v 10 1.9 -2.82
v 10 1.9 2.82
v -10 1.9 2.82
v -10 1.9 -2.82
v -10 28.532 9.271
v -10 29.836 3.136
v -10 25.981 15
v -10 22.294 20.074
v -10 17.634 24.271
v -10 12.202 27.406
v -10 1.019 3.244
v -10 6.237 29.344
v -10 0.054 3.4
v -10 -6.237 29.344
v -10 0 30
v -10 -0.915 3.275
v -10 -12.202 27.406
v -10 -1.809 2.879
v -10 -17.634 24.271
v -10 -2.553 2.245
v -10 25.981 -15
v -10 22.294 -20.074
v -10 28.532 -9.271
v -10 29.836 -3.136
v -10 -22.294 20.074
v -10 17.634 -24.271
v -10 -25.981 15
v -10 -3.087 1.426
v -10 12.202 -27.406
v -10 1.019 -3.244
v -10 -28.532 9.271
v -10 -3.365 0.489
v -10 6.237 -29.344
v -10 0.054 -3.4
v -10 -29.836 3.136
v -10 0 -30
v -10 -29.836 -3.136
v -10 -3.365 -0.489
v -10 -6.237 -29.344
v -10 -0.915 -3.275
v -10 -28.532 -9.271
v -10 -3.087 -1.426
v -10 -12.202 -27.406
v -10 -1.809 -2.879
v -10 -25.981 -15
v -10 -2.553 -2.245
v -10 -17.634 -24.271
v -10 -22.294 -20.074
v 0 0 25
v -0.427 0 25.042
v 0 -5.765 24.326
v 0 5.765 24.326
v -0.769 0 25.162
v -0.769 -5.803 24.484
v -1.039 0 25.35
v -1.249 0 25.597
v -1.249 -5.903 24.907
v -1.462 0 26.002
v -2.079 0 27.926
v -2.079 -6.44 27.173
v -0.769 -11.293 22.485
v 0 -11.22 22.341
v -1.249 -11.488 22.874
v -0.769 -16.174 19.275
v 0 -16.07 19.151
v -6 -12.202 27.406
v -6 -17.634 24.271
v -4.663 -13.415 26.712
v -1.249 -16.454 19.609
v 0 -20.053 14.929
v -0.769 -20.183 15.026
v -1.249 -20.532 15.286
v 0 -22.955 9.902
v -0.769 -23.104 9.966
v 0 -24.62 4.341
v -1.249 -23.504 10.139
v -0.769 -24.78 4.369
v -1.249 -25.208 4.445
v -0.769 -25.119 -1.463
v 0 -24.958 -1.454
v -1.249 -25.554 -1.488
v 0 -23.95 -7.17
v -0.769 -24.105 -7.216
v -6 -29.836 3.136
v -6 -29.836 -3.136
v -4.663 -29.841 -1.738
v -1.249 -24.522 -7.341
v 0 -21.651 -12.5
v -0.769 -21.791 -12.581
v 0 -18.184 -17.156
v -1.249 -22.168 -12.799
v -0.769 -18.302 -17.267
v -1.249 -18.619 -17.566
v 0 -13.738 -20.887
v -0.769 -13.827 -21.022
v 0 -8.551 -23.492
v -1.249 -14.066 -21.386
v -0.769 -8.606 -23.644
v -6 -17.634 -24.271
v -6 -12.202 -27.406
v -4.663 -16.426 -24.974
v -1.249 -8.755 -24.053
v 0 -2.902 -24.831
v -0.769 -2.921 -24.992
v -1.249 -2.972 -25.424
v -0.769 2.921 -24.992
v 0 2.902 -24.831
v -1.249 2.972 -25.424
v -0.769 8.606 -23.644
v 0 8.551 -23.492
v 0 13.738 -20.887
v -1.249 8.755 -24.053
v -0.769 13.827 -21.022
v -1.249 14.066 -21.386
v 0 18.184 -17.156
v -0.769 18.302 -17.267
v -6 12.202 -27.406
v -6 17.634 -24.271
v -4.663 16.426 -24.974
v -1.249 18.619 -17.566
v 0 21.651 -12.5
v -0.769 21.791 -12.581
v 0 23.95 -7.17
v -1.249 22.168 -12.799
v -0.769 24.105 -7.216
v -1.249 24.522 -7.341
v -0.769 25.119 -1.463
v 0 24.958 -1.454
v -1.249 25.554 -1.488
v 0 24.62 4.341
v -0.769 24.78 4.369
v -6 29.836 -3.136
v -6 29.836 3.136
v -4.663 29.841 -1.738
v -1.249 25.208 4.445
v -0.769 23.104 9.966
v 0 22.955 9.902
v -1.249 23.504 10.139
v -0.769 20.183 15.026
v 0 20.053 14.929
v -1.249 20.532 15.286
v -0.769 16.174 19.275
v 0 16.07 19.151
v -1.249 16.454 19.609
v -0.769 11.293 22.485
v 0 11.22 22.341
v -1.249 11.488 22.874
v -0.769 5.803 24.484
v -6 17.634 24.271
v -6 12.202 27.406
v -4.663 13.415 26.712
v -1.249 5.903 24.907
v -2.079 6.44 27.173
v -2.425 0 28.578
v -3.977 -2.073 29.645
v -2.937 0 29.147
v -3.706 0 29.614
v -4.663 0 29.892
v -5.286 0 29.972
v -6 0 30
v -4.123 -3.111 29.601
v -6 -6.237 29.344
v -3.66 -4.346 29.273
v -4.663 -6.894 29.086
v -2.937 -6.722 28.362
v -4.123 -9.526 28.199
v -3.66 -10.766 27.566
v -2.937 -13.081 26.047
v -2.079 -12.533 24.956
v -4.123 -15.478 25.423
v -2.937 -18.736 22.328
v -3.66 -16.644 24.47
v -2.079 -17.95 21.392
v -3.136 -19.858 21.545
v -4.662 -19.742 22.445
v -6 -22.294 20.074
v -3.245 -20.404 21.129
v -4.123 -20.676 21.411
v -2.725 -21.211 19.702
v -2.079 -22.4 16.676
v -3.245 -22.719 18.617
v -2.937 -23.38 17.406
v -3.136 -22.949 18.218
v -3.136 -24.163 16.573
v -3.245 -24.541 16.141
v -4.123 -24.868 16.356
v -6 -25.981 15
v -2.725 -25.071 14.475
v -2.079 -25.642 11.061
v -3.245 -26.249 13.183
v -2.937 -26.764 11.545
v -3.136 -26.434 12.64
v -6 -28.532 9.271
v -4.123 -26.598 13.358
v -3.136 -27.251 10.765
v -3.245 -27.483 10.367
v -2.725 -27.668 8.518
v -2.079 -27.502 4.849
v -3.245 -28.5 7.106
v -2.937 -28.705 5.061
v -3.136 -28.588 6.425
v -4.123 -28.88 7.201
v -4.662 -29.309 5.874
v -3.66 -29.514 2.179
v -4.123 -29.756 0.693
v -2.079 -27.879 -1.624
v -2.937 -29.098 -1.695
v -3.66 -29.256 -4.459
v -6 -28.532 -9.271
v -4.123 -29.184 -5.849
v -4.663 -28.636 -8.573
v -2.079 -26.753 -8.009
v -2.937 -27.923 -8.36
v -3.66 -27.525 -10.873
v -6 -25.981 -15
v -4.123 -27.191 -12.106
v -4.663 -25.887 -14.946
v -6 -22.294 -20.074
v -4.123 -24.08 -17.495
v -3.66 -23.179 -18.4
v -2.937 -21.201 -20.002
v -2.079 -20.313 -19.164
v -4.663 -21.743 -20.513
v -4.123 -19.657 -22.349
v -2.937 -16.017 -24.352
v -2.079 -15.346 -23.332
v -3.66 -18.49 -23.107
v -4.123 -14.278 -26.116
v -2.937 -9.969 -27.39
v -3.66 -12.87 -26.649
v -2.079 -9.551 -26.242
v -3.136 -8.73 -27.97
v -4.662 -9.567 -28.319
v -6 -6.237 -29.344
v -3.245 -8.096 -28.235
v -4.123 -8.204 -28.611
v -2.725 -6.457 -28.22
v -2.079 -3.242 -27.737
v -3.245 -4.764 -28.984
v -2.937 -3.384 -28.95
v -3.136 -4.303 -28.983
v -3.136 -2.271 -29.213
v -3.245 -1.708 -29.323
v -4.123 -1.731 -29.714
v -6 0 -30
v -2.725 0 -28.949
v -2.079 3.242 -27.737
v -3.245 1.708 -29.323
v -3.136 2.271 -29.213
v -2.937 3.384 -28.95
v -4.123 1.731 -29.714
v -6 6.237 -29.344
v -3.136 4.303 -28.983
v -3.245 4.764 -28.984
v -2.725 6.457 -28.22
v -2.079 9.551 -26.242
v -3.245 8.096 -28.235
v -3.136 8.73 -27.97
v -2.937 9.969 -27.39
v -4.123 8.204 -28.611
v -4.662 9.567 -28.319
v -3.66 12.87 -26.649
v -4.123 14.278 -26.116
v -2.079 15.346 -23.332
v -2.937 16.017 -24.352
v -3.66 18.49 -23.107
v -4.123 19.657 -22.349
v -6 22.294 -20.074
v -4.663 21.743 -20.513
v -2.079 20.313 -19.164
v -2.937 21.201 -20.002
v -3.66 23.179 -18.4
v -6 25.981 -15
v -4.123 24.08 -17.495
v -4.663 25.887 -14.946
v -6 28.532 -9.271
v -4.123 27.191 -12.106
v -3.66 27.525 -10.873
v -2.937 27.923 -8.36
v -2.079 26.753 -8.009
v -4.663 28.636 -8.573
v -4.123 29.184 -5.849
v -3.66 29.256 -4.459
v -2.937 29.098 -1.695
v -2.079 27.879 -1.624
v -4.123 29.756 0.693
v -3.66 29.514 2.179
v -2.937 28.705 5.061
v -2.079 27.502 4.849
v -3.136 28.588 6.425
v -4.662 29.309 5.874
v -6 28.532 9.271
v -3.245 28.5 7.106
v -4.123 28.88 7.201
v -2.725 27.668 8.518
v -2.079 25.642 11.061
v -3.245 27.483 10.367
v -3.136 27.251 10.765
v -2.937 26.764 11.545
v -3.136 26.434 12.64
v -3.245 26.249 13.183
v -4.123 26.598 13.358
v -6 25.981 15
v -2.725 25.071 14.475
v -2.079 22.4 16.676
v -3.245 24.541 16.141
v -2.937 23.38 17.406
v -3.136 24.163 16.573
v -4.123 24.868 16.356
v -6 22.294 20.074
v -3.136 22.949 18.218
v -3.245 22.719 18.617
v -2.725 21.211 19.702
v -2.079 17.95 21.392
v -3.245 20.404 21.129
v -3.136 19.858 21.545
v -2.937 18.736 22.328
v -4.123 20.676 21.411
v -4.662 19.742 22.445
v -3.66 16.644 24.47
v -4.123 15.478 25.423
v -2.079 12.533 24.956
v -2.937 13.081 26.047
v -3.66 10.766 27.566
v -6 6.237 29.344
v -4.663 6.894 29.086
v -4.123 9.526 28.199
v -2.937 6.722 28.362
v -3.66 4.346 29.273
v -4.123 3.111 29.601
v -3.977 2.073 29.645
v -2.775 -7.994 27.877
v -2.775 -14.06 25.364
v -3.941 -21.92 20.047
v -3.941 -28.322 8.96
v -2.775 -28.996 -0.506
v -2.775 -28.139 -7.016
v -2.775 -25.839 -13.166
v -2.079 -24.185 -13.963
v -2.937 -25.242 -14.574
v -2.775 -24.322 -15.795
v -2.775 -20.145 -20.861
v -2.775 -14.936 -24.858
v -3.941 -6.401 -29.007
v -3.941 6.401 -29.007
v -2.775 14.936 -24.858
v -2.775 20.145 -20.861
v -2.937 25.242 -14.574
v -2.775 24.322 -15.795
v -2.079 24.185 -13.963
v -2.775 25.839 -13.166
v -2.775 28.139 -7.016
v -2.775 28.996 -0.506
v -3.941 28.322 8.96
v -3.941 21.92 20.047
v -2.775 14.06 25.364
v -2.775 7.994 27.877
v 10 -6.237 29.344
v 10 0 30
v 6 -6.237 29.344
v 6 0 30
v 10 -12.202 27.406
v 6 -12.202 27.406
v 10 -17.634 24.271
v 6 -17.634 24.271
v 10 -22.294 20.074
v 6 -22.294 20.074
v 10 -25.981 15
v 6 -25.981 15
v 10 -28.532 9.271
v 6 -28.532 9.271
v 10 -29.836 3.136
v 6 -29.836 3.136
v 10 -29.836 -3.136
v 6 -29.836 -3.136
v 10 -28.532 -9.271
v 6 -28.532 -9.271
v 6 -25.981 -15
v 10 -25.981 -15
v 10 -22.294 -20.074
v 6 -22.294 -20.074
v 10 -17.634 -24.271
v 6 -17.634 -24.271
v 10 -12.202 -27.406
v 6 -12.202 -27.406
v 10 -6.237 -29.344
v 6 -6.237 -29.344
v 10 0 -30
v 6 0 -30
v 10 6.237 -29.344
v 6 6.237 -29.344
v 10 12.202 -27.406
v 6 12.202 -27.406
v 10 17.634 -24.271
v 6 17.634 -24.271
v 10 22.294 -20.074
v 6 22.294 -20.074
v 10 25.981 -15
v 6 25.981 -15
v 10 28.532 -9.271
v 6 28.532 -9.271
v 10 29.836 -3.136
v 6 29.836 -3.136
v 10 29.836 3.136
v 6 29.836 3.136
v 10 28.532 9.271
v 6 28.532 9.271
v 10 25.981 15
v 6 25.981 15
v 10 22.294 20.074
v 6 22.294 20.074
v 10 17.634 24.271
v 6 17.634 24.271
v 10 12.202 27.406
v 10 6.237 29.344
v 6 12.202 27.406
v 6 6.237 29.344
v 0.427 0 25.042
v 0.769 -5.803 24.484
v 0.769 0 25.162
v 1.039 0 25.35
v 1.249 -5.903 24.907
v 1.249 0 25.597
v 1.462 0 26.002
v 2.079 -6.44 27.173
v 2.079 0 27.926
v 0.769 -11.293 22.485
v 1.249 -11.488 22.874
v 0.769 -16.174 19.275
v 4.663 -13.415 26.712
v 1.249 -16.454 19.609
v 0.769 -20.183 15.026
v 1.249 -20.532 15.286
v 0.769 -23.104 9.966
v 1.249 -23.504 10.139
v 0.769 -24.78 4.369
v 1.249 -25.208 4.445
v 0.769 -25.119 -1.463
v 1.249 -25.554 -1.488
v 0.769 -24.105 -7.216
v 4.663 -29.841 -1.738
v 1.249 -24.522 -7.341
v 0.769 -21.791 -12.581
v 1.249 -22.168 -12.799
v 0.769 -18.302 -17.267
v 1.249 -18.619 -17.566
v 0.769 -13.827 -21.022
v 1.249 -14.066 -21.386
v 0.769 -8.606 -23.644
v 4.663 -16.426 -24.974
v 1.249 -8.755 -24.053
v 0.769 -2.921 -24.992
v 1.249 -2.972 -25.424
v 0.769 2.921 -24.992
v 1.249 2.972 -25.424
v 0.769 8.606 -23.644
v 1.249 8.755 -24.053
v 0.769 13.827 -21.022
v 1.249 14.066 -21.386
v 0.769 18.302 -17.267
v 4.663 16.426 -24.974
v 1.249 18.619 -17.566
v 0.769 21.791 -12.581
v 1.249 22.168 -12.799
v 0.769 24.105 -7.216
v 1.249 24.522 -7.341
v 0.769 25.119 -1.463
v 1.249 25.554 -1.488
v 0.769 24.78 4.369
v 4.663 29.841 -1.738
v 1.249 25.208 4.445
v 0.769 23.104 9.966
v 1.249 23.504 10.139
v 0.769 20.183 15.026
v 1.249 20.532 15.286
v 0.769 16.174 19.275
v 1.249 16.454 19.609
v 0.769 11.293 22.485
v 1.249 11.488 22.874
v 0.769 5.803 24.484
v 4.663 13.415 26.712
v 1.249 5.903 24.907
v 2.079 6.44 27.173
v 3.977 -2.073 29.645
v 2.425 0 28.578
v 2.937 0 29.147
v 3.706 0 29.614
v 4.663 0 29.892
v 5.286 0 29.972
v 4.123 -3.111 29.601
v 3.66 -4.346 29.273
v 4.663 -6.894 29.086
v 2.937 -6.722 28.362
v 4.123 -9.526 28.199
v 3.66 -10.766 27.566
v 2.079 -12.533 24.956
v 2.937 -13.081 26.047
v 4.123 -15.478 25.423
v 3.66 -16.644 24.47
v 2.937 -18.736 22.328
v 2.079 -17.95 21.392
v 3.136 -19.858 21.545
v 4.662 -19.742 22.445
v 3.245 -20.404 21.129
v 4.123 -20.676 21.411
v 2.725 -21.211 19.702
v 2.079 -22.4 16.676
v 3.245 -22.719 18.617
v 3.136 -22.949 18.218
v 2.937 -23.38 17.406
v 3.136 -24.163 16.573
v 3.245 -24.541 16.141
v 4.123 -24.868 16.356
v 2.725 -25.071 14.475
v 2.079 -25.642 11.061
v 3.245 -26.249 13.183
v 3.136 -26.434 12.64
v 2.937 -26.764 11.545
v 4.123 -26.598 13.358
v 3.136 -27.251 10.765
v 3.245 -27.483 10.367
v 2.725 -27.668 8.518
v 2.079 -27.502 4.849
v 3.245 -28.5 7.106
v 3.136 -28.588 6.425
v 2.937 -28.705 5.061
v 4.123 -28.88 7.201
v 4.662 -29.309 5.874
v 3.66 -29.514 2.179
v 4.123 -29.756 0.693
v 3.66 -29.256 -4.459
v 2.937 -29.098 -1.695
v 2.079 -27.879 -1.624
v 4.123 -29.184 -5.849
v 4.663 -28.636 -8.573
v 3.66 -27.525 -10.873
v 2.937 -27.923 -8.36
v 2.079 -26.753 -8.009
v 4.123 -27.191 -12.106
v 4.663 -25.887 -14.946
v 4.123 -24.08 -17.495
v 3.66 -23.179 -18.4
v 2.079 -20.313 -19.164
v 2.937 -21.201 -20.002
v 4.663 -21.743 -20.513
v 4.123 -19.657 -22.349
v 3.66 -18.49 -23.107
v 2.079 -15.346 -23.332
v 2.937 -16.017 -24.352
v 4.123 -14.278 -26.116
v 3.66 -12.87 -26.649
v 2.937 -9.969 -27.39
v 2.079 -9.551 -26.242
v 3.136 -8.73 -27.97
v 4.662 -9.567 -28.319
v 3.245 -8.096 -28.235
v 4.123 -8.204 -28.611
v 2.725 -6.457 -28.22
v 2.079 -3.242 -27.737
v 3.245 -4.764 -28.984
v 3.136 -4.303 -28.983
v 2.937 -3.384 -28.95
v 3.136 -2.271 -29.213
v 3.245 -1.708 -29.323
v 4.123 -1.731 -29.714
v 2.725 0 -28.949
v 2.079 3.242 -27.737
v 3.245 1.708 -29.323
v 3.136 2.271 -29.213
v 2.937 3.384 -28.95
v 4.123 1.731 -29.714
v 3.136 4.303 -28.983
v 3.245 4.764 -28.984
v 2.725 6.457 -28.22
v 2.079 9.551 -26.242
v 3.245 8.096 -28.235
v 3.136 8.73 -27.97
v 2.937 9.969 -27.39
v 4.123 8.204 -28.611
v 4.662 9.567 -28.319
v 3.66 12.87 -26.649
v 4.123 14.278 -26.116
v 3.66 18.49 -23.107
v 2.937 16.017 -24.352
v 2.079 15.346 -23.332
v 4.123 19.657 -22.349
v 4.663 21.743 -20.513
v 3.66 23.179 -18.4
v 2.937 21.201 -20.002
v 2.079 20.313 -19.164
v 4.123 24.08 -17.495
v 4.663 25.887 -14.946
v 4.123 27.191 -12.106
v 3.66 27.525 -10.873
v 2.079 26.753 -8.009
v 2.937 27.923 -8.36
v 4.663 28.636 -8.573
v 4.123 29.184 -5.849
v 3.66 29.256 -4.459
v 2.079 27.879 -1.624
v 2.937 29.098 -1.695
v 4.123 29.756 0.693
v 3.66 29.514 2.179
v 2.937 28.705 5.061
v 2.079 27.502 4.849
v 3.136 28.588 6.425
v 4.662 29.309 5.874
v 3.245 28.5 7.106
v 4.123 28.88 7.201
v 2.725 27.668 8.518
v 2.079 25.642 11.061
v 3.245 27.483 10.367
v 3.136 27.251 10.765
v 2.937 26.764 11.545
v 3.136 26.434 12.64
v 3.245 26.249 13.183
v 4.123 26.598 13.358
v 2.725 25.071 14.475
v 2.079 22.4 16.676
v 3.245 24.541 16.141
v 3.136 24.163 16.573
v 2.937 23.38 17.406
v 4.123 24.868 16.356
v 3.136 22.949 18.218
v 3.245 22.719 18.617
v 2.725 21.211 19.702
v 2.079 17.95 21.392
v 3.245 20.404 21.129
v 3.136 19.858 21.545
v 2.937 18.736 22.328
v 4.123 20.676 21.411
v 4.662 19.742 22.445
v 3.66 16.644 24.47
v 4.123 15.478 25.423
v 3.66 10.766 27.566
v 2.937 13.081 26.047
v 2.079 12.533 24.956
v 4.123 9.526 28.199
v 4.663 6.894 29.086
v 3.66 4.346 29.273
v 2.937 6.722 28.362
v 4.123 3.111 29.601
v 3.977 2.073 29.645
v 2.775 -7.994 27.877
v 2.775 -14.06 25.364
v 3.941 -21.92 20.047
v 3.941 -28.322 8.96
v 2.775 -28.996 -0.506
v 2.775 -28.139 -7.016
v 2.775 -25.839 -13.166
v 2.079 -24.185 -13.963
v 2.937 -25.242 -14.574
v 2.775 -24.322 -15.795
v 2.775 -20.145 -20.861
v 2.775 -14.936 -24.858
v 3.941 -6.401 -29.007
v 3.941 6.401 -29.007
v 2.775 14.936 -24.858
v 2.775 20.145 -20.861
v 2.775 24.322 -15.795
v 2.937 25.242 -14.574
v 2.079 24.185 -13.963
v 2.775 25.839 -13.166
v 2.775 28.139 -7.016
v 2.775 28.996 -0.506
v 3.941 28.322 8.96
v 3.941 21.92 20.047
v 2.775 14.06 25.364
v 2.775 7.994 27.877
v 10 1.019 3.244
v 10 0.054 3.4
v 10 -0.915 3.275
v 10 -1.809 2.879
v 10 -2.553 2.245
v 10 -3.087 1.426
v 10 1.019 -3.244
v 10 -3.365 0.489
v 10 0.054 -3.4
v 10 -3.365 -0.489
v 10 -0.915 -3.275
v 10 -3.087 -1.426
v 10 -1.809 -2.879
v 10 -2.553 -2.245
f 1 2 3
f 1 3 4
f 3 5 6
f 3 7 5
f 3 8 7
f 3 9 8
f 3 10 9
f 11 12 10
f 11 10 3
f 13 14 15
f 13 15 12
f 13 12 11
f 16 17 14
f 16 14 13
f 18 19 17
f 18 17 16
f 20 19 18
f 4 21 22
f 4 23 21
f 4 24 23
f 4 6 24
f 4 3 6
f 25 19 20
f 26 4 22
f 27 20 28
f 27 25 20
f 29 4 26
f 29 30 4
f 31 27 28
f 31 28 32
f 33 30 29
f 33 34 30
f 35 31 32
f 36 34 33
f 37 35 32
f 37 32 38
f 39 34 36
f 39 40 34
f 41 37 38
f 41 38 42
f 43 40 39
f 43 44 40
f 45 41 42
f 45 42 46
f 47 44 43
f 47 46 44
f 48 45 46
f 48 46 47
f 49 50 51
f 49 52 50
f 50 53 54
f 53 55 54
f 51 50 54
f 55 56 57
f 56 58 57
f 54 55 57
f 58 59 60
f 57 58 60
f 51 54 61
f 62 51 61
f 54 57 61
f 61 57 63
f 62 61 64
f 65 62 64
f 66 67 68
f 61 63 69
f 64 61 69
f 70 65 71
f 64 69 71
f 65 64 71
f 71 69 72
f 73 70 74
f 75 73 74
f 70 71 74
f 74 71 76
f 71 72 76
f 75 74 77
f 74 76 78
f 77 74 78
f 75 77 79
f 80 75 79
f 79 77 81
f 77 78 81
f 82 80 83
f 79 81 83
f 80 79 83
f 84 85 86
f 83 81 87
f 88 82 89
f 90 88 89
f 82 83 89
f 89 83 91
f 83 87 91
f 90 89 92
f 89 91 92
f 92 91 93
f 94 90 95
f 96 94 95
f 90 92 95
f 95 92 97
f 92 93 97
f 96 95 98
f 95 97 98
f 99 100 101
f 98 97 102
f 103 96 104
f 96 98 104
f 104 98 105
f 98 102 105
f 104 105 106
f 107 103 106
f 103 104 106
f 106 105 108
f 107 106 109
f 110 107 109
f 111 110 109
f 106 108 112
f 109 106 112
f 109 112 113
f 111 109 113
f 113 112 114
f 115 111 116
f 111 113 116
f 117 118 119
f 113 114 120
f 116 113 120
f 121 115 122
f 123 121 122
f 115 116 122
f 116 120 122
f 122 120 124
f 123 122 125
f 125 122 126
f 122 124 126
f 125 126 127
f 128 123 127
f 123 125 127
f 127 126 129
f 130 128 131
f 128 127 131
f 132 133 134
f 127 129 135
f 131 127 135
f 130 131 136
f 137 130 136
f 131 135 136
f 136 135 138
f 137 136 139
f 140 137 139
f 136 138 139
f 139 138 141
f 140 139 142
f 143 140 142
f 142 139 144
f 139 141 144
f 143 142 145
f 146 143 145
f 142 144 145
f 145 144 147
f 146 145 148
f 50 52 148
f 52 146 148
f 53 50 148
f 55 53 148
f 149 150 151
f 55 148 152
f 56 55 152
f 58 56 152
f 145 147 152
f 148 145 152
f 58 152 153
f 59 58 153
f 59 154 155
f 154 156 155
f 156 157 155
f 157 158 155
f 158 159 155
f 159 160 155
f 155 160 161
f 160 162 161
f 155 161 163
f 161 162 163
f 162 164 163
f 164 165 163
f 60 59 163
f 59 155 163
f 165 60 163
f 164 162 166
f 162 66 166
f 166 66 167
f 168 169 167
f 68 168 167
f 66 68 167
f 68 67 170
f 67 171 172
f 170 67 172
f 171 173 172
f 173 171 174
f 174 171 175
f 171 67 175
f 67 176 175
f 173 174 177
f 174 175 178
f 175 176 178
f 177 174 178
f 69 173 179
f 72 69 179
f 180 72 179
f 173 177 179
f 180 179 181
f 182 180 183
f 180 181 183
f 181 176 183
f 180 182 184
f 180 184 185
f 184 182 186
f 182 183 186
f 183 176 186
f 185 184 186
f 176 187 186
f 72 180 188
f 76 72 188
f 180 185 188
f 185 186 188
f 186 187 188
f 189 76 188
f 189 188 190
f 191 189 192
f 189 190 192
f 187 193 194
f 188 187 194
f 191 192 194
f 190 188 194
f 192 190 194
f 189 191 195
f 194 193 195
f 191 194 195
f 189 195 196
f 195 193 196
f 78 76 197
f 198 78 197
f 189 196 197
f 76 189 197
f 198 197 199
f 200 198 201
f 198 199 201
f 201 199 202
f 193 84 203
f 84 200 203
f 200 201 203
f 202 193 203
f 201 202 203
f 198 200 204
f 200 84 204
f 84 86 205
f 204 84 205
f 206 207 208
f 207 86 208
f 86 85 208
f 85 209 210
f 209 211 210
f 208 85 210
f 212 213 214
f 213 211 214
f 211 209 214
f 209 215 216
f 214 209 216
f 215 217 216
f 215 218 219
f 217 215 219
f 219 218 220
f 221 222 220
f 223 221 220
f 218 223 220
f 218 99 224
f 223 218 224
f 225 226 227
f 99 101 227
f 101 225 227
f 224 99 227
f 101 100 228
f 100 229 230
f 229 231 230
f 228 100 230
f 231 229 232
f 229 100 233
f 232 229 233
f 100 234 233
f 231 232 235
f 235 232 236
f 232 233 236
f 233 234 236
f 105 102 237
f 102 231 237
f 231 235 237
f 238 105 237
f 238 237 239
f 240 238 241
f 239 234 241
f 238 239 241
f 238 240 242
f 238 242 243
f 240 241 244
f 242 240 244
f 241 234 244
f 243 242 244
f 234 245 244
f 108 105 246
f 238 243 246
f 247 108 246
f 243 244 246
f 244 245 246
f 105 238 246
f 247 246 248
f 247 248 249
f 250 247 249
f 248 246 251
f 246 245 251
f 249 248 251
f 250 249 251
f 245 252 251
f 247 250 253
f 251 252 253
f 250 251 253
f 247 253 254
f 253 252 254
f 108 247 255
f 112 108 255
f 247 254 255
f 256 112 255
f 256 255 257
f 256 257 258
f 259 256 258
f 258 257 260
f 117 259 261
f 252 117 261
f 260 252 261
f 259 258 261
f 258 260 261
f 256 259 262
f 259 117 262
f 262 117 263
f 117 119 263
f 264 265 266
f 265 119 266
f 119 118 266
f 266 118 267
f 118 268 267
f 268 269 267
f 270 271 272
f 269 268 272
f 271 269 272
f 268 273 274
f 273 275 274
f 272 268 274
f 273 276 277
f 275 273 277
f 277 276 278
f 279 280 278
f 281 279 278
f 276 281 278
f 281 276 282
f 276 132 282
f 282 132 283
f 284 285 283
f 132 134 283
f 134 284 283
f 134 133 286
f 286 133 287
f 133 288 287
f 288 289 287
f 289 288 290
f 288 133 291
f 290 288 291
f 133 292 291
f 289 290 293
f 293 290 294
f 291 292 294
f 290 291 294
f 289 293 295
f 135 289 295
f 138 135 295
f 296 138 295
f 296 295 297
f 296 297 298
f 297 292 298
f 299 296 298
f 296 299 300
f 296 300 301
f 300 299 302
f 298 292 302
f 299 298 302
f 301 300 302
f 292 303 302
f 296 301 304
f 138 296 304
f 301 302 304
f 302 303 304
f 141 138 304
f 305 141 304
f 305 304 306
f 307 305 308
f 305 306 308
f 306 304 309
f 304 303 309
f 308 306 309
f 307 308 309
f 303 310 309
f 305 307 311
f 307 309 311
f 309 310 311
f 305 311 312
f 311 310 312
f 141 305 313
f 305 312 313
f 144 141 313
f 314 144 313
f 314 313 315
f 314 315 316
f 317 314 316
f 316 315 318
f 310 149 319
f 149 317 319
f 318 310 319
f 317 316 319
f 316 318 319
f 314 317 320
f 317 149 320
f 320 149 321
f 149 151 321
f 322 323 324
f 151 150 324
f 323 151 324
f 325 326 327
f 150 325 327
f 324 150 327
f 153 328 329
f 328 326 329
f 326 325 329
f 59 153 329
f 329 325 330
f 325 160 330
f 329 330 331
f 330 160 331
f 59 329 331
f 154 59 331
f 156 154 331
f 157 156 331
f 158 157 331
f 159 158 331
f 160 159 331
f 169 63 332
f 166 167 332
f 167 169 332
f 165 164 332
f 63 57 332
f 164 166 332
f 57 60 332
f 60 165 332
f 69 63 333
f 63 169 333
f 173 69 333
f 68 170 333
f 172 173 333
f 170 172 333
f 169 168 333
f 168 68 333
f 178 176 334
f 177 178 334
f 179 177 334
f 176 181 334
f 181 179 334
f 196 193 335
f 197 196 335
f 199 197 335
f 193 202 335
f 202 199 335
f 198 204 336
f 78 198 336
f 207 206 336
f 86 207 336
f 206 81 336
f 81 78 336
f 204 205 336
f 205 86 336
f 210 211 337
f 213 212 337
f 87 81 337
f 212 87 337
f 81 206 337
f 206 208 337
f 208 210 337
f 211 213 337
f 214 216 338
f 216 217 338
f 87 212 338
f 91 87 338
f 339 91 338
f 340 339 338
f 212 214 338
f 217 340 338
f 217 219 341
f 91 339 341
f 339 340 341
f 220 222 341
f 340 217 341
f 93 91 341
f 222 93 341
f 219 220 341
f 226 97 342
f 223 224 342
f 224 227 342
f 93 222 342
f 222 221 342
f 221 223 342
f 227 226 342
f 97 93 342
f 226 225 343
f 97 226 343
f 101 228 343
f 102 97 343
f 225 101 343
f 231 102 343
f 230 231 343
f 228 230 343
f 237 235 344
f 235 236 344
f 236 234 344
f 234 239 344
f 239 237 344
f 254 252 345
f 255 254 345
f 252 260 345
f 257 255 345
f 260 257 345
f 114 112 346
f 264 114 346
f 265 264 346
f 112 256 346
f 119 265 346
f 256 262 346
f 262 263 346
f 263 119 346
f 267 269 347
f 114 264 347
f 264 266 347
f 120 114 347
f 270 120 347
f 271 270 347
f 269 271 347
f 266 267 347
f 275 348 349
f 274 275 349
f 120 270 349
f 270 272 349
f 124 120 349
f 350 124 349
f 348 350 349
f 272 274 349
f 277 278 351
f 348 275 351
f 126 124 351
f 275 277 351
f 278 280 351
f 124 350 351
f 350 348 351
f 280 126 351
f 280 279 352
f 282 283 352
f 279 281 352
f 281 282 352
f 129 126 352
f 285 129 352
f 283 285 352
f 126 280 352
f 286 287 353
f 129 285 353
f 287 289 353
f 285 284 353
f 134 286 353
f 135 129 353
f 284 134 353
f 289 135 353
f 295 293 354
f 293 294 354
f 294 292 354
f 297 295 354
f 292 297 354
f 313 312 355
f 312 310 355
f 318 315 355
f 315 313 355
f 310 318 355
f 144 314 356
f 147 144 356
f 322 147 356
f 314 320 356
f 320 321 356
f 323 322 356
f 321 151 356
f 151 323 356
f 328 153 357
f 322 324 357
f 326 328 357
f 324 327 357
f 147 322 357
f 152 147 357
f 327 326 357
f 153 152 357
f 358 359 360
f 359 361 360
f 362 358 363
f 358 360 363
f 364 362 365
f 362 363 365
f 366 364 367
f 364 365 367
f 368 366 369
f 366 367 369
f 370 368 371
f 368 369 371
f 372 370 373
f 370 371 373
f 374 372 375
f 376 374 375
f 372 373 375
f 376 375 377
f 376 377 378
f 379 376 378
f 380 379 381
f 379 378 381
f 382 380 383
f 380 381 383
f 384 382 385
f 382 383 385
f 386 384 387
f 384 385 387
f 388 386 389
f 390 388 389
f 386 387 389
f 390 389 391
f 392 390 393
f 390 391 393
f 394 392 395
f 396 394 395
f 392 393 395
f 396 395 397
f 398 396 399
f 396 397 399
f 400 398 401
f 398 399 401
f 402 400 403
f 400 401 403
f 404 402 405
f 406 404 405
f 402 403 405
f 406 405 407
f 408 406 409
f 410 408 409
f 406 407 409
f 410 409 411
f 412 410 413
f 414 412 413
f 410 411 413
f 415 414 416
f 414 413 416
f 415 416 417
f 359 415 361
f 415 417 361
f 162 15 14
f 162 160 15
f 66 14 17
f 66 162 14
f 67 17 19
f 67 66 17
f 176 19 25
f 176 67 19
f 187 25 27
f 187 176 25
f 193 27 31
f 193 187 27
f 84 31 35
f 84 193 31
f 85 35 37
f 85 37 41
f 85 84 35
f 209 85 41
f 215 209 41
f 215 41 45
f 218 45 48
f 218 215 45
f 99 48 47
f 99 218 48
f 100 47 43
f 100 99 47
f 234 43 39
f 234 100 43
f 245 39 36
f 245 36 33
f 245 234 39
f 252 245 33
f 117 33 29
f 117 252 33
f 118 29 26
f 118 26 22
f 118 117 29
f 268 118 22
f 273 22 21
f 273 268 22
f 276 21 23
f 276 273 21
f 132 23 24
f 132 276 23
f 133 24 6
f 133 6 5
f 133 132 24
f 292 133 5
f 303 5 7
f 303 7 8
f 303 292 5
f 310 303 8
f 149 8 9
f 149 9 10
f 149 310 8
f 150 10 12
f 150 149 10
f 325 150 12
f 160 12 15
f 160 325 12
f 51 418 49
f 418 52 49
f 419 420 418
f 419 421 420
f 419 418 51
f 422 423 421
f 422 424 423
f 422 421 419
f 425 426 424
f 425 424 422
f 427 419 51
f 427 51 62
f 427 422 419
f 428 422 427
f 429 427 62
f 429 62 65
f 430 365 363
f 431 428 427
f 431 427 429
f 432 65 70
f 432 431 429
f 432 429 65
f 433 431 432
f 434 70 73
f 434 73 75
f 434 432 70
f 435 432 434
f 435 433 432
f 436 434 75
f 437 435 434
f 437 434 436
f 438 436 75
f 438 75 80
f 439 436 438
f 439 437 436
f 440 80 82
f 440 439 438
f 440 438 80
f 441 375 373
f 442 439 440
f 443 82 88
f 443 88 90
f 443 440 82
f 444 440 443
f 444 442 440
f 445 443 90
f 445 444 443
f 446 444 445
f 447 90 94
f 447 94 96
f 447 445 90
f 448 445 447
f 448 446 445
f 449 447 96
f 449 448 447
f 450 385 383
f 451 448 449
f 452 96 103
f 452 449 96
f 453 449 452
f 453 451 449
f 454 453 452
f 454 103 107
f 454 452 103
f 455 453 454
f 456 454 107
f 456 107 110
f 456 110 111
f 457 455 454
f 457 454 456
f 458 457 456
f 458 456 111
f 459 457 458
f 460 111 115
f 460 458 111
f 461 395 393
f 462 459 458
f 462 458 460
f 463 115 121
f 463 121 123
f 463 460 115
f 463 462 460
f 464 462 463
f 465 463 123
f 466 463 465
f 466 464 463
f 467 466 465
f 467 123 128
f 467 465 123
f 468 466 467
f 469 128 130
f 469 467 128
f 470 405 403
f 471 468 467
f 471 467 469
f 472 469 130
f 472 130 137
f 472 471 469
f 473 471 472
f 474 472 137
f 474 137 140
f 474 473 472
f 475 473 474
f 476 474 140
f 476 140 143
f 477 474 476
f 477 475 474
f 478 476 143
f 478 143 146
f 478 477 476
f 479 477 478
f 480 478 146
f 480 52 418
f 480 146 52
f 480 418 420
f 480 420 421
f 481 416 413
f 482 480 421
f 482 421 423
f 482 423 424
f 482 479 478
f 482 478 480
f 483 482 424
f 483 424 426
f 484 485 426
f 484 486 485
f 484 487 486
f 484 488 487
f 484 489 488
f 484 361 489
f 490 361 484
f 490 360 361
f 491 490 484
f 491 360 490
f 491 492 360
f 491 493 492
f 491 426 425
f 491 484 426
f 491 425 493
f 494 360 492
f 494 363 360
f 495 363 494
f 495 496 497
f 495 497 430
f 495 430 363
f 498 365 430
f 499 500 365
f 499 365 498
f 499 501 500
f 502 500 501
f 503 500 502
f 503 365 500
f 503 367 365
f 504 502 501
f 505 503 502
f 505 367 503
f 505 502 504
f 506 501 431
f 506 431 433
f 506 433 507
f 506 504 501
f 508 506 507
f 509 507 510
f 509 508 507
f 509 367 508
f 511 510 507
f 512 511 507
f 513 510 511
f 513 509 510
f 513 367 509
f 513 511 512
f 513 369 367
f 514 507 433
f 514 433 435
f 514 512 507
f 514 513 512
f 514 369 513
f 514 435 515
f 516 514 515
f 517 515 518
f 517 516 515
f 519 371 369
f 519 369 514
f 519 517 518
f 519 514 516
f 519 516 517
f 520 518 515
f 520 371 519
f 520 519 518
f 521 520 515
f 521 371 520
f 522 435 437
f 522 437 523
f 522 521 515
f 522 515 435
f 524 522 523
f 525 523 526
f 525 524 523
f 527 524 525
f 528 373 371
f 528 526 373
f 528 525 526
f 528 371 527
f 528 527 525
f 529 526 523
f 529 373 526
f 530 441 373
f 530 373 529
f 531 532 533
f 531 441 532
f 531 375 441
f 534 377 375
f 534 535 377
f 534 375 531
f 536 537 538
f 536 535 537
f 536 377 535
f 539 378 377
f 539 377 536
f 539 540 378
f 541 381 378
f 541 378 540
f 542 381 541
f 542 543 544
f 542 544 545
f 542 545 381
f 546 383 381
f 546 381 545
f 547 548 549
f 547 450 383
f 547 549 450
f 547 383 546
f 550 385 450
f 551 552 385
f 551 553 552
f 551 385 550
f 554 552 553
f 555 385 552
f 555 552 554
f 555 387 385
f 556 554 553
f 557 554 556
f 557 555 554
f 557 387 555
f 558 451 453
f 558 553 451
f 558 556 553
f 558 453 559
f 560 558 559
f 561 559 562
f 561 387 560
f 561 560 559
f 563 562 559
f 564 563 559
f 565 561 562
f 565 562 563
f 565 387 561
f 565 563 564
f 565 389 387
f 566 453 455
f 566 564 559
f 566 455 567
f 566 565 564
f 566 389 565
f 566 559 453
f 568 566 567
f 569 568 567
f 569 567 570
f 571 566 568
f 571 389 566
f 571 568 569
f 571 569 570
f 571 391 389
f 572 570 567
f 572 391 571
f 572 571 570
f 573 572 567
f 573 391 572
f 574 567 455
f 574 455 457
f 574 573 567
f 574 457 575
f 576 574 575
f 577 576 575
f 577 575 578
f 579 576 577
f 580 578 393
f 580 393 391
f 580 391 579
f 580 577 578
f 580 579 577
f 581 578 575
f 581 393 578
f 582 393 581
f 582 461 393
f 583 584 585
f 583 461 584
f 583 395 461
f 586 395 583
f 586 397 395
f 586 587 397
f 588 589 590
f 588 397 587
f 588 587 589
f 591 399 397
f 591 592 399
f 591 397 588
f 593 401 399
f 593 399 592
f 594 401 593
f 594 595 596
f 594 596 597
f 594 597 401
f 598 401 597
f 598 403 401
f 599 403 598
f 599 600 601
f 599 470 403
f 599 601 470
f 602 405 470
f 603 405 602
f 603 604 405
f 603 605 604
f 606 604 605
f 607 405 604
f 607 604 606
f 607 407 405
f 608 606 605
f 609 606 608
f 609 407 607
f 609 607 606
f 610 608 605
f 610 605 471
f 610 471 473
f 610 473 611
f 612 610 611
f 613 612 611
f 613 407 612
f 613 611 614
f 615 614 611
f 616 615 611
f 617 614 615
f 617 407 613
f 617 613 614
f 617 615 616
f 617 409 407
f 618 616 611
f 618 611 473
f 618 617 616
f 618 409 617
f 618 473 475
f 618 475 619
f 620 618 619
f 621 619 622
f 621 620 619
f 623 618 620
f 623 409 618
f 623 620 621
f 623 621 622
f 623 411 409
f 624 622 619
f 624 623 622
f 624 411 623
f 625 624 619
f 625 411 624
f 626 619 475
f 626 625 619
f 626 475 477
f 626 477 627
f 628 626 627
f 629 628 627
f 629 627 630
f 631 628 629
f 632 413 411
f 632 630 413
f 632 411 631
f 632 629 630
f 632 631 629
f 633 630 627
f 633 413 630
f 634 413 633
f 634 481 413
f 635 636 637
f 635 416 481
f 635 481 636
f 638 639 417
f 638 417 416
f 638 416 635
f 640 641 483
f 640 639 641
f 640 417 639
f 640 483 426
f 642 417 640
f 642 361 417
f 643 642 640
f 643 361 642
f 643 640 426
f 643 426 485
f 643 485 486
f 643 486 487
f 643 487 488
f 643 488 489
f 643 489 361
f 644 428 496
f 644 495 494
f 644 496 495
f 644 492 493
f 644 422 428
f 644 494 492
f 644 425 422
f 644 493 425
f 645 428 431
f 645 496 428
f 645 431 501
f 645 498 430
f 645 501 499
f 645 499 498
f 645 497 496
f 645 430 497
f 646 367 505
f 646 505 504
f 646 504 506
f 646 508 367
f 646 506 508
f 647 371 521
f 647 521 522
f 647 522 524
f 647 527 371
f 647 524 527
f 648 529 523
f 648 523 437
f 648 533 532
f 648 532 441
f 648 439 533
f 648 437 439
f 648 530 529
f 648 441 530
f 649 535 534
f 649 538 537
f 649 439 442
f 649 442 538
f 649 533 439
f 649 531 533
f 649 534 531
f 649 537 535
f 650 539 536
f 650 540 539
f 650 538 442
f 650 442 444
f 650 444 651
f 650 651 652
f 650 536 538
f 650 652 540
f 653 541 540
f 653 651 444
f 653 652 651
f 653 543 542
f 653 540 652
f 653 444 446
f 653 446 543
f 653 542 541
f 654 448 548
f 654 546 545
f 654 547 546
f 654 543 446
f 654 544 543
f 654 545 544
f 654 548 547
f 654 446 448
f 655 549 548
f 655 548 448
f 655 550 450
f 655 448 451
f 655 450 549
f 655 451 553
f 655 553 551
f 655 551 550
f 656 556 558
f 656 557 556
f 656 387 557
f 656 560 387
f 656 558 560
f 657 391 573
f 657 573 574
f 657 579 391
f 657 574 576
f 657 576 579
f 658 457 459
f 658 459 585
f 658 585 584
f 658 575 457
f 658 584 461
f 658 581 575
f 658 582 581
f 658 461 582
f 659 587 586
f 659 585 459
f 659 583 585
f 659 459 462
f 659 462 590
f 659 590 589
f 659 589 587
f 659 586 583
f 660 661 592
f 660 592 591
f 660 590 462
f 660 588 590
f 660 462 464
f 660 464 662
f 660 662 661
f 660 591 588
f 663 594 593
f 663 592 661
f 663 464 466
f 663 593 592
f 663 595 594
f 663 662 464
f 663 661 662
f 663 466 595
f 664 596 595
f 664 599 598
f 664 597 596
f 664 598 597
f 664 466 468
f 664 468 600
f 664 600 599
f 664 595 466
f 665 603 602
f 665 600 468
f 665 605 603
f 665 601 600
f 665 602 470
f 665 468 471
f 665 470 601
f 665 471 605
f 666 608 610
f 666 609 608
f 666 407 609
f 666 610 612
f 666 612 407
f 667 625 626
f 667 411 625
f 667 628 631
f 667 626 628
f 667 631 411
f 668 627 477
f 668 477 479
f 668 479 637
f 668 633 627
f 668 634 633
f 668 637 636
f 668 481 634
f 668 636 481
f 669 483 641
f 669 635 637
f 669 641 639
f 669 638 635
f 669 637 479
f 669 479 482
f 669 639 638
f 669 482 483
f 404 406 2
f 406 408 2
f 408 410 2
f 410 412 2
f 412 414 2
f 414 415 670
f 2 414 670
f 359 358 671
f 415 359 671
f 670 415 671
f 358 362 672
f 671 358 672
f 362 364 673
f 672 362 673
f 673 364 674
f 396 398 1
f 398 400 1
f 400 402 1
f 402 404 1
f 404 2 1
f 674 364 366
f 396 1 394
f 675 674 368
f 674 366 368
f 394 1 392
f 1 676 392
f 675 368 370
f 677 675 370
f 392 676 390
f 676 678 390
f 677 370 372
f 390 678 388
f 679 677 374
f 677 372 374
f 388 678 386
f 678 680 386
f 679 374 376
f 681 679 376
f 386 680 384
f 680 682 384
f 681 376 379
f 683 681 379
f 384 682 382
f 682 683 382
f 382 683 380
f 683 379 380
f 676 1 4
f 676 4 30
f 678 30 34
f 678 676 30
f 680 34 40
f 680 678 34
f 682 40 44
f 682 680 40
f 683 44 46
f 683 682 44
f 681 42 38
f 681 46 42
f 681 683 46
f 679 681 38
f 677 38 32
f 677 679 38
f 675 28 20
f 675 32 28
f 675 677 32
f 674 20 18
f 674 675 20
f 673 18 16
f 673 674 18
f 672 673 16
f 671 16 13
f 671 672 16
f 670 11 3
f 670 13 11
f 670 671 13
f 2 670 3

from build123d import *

# Parameters (mm, degrees)
CUT_EXTRUDE1_DEPTH = 47.904157726


with BuildPart() as part:
    # Sketch1 → Revolve1 (revolve)
    with BuildSketch(Plane.XY, mode=Mode.PRIVATE) as revolve1_sk:
        with BuildLine():
            Line((0, 25), (0, 0))
            Line((0, 0), (10, 0))
            Line((10, 0), (10, 30))
            Line((10, 30), (6, 30))
            add(Edge.make_bspline(
                [(0, 25), (2.935087376, 25), (0.191816931, 30), (6, 30)],
                knots=[0, 0, 0, 0, 1, 1, 1, 1], degree=3))
        make_face()
    revolve1 = revolve(revolve1_sk.sketch.rotate(Axis((0, 0, 0), (1, 0, 0)), 90), axis=Axis((0, 0, 0), (1, 0, 0)))

    # Mirror1: Revolve1 across plane
    add(revolve1.mirror(Plane(origin=(0, 25, 0), x_dir=(0, 0, 1), z_dir=(1, 0, 0))))

    # Sketch2 → Cut-Extrude1 (cut, through all)
    with BuildSketch(Plane(origin=(10, 0, 0), x_dir=(0, 0, -1), z_dir=(1, 0, 0))):
        with BuildLine():
            Line((-2.819574436, 1.9), (2.819574436, 1.9))
            ThreePointArc((2.819574436, 1.9), (0, -3.4), (-2.819574436, 1.9))
        make_face()
    extrude(amount=-CUT_EXTRUDE1_DEPTH, mode=Mode.SUBTRACT)


solid = part.part
